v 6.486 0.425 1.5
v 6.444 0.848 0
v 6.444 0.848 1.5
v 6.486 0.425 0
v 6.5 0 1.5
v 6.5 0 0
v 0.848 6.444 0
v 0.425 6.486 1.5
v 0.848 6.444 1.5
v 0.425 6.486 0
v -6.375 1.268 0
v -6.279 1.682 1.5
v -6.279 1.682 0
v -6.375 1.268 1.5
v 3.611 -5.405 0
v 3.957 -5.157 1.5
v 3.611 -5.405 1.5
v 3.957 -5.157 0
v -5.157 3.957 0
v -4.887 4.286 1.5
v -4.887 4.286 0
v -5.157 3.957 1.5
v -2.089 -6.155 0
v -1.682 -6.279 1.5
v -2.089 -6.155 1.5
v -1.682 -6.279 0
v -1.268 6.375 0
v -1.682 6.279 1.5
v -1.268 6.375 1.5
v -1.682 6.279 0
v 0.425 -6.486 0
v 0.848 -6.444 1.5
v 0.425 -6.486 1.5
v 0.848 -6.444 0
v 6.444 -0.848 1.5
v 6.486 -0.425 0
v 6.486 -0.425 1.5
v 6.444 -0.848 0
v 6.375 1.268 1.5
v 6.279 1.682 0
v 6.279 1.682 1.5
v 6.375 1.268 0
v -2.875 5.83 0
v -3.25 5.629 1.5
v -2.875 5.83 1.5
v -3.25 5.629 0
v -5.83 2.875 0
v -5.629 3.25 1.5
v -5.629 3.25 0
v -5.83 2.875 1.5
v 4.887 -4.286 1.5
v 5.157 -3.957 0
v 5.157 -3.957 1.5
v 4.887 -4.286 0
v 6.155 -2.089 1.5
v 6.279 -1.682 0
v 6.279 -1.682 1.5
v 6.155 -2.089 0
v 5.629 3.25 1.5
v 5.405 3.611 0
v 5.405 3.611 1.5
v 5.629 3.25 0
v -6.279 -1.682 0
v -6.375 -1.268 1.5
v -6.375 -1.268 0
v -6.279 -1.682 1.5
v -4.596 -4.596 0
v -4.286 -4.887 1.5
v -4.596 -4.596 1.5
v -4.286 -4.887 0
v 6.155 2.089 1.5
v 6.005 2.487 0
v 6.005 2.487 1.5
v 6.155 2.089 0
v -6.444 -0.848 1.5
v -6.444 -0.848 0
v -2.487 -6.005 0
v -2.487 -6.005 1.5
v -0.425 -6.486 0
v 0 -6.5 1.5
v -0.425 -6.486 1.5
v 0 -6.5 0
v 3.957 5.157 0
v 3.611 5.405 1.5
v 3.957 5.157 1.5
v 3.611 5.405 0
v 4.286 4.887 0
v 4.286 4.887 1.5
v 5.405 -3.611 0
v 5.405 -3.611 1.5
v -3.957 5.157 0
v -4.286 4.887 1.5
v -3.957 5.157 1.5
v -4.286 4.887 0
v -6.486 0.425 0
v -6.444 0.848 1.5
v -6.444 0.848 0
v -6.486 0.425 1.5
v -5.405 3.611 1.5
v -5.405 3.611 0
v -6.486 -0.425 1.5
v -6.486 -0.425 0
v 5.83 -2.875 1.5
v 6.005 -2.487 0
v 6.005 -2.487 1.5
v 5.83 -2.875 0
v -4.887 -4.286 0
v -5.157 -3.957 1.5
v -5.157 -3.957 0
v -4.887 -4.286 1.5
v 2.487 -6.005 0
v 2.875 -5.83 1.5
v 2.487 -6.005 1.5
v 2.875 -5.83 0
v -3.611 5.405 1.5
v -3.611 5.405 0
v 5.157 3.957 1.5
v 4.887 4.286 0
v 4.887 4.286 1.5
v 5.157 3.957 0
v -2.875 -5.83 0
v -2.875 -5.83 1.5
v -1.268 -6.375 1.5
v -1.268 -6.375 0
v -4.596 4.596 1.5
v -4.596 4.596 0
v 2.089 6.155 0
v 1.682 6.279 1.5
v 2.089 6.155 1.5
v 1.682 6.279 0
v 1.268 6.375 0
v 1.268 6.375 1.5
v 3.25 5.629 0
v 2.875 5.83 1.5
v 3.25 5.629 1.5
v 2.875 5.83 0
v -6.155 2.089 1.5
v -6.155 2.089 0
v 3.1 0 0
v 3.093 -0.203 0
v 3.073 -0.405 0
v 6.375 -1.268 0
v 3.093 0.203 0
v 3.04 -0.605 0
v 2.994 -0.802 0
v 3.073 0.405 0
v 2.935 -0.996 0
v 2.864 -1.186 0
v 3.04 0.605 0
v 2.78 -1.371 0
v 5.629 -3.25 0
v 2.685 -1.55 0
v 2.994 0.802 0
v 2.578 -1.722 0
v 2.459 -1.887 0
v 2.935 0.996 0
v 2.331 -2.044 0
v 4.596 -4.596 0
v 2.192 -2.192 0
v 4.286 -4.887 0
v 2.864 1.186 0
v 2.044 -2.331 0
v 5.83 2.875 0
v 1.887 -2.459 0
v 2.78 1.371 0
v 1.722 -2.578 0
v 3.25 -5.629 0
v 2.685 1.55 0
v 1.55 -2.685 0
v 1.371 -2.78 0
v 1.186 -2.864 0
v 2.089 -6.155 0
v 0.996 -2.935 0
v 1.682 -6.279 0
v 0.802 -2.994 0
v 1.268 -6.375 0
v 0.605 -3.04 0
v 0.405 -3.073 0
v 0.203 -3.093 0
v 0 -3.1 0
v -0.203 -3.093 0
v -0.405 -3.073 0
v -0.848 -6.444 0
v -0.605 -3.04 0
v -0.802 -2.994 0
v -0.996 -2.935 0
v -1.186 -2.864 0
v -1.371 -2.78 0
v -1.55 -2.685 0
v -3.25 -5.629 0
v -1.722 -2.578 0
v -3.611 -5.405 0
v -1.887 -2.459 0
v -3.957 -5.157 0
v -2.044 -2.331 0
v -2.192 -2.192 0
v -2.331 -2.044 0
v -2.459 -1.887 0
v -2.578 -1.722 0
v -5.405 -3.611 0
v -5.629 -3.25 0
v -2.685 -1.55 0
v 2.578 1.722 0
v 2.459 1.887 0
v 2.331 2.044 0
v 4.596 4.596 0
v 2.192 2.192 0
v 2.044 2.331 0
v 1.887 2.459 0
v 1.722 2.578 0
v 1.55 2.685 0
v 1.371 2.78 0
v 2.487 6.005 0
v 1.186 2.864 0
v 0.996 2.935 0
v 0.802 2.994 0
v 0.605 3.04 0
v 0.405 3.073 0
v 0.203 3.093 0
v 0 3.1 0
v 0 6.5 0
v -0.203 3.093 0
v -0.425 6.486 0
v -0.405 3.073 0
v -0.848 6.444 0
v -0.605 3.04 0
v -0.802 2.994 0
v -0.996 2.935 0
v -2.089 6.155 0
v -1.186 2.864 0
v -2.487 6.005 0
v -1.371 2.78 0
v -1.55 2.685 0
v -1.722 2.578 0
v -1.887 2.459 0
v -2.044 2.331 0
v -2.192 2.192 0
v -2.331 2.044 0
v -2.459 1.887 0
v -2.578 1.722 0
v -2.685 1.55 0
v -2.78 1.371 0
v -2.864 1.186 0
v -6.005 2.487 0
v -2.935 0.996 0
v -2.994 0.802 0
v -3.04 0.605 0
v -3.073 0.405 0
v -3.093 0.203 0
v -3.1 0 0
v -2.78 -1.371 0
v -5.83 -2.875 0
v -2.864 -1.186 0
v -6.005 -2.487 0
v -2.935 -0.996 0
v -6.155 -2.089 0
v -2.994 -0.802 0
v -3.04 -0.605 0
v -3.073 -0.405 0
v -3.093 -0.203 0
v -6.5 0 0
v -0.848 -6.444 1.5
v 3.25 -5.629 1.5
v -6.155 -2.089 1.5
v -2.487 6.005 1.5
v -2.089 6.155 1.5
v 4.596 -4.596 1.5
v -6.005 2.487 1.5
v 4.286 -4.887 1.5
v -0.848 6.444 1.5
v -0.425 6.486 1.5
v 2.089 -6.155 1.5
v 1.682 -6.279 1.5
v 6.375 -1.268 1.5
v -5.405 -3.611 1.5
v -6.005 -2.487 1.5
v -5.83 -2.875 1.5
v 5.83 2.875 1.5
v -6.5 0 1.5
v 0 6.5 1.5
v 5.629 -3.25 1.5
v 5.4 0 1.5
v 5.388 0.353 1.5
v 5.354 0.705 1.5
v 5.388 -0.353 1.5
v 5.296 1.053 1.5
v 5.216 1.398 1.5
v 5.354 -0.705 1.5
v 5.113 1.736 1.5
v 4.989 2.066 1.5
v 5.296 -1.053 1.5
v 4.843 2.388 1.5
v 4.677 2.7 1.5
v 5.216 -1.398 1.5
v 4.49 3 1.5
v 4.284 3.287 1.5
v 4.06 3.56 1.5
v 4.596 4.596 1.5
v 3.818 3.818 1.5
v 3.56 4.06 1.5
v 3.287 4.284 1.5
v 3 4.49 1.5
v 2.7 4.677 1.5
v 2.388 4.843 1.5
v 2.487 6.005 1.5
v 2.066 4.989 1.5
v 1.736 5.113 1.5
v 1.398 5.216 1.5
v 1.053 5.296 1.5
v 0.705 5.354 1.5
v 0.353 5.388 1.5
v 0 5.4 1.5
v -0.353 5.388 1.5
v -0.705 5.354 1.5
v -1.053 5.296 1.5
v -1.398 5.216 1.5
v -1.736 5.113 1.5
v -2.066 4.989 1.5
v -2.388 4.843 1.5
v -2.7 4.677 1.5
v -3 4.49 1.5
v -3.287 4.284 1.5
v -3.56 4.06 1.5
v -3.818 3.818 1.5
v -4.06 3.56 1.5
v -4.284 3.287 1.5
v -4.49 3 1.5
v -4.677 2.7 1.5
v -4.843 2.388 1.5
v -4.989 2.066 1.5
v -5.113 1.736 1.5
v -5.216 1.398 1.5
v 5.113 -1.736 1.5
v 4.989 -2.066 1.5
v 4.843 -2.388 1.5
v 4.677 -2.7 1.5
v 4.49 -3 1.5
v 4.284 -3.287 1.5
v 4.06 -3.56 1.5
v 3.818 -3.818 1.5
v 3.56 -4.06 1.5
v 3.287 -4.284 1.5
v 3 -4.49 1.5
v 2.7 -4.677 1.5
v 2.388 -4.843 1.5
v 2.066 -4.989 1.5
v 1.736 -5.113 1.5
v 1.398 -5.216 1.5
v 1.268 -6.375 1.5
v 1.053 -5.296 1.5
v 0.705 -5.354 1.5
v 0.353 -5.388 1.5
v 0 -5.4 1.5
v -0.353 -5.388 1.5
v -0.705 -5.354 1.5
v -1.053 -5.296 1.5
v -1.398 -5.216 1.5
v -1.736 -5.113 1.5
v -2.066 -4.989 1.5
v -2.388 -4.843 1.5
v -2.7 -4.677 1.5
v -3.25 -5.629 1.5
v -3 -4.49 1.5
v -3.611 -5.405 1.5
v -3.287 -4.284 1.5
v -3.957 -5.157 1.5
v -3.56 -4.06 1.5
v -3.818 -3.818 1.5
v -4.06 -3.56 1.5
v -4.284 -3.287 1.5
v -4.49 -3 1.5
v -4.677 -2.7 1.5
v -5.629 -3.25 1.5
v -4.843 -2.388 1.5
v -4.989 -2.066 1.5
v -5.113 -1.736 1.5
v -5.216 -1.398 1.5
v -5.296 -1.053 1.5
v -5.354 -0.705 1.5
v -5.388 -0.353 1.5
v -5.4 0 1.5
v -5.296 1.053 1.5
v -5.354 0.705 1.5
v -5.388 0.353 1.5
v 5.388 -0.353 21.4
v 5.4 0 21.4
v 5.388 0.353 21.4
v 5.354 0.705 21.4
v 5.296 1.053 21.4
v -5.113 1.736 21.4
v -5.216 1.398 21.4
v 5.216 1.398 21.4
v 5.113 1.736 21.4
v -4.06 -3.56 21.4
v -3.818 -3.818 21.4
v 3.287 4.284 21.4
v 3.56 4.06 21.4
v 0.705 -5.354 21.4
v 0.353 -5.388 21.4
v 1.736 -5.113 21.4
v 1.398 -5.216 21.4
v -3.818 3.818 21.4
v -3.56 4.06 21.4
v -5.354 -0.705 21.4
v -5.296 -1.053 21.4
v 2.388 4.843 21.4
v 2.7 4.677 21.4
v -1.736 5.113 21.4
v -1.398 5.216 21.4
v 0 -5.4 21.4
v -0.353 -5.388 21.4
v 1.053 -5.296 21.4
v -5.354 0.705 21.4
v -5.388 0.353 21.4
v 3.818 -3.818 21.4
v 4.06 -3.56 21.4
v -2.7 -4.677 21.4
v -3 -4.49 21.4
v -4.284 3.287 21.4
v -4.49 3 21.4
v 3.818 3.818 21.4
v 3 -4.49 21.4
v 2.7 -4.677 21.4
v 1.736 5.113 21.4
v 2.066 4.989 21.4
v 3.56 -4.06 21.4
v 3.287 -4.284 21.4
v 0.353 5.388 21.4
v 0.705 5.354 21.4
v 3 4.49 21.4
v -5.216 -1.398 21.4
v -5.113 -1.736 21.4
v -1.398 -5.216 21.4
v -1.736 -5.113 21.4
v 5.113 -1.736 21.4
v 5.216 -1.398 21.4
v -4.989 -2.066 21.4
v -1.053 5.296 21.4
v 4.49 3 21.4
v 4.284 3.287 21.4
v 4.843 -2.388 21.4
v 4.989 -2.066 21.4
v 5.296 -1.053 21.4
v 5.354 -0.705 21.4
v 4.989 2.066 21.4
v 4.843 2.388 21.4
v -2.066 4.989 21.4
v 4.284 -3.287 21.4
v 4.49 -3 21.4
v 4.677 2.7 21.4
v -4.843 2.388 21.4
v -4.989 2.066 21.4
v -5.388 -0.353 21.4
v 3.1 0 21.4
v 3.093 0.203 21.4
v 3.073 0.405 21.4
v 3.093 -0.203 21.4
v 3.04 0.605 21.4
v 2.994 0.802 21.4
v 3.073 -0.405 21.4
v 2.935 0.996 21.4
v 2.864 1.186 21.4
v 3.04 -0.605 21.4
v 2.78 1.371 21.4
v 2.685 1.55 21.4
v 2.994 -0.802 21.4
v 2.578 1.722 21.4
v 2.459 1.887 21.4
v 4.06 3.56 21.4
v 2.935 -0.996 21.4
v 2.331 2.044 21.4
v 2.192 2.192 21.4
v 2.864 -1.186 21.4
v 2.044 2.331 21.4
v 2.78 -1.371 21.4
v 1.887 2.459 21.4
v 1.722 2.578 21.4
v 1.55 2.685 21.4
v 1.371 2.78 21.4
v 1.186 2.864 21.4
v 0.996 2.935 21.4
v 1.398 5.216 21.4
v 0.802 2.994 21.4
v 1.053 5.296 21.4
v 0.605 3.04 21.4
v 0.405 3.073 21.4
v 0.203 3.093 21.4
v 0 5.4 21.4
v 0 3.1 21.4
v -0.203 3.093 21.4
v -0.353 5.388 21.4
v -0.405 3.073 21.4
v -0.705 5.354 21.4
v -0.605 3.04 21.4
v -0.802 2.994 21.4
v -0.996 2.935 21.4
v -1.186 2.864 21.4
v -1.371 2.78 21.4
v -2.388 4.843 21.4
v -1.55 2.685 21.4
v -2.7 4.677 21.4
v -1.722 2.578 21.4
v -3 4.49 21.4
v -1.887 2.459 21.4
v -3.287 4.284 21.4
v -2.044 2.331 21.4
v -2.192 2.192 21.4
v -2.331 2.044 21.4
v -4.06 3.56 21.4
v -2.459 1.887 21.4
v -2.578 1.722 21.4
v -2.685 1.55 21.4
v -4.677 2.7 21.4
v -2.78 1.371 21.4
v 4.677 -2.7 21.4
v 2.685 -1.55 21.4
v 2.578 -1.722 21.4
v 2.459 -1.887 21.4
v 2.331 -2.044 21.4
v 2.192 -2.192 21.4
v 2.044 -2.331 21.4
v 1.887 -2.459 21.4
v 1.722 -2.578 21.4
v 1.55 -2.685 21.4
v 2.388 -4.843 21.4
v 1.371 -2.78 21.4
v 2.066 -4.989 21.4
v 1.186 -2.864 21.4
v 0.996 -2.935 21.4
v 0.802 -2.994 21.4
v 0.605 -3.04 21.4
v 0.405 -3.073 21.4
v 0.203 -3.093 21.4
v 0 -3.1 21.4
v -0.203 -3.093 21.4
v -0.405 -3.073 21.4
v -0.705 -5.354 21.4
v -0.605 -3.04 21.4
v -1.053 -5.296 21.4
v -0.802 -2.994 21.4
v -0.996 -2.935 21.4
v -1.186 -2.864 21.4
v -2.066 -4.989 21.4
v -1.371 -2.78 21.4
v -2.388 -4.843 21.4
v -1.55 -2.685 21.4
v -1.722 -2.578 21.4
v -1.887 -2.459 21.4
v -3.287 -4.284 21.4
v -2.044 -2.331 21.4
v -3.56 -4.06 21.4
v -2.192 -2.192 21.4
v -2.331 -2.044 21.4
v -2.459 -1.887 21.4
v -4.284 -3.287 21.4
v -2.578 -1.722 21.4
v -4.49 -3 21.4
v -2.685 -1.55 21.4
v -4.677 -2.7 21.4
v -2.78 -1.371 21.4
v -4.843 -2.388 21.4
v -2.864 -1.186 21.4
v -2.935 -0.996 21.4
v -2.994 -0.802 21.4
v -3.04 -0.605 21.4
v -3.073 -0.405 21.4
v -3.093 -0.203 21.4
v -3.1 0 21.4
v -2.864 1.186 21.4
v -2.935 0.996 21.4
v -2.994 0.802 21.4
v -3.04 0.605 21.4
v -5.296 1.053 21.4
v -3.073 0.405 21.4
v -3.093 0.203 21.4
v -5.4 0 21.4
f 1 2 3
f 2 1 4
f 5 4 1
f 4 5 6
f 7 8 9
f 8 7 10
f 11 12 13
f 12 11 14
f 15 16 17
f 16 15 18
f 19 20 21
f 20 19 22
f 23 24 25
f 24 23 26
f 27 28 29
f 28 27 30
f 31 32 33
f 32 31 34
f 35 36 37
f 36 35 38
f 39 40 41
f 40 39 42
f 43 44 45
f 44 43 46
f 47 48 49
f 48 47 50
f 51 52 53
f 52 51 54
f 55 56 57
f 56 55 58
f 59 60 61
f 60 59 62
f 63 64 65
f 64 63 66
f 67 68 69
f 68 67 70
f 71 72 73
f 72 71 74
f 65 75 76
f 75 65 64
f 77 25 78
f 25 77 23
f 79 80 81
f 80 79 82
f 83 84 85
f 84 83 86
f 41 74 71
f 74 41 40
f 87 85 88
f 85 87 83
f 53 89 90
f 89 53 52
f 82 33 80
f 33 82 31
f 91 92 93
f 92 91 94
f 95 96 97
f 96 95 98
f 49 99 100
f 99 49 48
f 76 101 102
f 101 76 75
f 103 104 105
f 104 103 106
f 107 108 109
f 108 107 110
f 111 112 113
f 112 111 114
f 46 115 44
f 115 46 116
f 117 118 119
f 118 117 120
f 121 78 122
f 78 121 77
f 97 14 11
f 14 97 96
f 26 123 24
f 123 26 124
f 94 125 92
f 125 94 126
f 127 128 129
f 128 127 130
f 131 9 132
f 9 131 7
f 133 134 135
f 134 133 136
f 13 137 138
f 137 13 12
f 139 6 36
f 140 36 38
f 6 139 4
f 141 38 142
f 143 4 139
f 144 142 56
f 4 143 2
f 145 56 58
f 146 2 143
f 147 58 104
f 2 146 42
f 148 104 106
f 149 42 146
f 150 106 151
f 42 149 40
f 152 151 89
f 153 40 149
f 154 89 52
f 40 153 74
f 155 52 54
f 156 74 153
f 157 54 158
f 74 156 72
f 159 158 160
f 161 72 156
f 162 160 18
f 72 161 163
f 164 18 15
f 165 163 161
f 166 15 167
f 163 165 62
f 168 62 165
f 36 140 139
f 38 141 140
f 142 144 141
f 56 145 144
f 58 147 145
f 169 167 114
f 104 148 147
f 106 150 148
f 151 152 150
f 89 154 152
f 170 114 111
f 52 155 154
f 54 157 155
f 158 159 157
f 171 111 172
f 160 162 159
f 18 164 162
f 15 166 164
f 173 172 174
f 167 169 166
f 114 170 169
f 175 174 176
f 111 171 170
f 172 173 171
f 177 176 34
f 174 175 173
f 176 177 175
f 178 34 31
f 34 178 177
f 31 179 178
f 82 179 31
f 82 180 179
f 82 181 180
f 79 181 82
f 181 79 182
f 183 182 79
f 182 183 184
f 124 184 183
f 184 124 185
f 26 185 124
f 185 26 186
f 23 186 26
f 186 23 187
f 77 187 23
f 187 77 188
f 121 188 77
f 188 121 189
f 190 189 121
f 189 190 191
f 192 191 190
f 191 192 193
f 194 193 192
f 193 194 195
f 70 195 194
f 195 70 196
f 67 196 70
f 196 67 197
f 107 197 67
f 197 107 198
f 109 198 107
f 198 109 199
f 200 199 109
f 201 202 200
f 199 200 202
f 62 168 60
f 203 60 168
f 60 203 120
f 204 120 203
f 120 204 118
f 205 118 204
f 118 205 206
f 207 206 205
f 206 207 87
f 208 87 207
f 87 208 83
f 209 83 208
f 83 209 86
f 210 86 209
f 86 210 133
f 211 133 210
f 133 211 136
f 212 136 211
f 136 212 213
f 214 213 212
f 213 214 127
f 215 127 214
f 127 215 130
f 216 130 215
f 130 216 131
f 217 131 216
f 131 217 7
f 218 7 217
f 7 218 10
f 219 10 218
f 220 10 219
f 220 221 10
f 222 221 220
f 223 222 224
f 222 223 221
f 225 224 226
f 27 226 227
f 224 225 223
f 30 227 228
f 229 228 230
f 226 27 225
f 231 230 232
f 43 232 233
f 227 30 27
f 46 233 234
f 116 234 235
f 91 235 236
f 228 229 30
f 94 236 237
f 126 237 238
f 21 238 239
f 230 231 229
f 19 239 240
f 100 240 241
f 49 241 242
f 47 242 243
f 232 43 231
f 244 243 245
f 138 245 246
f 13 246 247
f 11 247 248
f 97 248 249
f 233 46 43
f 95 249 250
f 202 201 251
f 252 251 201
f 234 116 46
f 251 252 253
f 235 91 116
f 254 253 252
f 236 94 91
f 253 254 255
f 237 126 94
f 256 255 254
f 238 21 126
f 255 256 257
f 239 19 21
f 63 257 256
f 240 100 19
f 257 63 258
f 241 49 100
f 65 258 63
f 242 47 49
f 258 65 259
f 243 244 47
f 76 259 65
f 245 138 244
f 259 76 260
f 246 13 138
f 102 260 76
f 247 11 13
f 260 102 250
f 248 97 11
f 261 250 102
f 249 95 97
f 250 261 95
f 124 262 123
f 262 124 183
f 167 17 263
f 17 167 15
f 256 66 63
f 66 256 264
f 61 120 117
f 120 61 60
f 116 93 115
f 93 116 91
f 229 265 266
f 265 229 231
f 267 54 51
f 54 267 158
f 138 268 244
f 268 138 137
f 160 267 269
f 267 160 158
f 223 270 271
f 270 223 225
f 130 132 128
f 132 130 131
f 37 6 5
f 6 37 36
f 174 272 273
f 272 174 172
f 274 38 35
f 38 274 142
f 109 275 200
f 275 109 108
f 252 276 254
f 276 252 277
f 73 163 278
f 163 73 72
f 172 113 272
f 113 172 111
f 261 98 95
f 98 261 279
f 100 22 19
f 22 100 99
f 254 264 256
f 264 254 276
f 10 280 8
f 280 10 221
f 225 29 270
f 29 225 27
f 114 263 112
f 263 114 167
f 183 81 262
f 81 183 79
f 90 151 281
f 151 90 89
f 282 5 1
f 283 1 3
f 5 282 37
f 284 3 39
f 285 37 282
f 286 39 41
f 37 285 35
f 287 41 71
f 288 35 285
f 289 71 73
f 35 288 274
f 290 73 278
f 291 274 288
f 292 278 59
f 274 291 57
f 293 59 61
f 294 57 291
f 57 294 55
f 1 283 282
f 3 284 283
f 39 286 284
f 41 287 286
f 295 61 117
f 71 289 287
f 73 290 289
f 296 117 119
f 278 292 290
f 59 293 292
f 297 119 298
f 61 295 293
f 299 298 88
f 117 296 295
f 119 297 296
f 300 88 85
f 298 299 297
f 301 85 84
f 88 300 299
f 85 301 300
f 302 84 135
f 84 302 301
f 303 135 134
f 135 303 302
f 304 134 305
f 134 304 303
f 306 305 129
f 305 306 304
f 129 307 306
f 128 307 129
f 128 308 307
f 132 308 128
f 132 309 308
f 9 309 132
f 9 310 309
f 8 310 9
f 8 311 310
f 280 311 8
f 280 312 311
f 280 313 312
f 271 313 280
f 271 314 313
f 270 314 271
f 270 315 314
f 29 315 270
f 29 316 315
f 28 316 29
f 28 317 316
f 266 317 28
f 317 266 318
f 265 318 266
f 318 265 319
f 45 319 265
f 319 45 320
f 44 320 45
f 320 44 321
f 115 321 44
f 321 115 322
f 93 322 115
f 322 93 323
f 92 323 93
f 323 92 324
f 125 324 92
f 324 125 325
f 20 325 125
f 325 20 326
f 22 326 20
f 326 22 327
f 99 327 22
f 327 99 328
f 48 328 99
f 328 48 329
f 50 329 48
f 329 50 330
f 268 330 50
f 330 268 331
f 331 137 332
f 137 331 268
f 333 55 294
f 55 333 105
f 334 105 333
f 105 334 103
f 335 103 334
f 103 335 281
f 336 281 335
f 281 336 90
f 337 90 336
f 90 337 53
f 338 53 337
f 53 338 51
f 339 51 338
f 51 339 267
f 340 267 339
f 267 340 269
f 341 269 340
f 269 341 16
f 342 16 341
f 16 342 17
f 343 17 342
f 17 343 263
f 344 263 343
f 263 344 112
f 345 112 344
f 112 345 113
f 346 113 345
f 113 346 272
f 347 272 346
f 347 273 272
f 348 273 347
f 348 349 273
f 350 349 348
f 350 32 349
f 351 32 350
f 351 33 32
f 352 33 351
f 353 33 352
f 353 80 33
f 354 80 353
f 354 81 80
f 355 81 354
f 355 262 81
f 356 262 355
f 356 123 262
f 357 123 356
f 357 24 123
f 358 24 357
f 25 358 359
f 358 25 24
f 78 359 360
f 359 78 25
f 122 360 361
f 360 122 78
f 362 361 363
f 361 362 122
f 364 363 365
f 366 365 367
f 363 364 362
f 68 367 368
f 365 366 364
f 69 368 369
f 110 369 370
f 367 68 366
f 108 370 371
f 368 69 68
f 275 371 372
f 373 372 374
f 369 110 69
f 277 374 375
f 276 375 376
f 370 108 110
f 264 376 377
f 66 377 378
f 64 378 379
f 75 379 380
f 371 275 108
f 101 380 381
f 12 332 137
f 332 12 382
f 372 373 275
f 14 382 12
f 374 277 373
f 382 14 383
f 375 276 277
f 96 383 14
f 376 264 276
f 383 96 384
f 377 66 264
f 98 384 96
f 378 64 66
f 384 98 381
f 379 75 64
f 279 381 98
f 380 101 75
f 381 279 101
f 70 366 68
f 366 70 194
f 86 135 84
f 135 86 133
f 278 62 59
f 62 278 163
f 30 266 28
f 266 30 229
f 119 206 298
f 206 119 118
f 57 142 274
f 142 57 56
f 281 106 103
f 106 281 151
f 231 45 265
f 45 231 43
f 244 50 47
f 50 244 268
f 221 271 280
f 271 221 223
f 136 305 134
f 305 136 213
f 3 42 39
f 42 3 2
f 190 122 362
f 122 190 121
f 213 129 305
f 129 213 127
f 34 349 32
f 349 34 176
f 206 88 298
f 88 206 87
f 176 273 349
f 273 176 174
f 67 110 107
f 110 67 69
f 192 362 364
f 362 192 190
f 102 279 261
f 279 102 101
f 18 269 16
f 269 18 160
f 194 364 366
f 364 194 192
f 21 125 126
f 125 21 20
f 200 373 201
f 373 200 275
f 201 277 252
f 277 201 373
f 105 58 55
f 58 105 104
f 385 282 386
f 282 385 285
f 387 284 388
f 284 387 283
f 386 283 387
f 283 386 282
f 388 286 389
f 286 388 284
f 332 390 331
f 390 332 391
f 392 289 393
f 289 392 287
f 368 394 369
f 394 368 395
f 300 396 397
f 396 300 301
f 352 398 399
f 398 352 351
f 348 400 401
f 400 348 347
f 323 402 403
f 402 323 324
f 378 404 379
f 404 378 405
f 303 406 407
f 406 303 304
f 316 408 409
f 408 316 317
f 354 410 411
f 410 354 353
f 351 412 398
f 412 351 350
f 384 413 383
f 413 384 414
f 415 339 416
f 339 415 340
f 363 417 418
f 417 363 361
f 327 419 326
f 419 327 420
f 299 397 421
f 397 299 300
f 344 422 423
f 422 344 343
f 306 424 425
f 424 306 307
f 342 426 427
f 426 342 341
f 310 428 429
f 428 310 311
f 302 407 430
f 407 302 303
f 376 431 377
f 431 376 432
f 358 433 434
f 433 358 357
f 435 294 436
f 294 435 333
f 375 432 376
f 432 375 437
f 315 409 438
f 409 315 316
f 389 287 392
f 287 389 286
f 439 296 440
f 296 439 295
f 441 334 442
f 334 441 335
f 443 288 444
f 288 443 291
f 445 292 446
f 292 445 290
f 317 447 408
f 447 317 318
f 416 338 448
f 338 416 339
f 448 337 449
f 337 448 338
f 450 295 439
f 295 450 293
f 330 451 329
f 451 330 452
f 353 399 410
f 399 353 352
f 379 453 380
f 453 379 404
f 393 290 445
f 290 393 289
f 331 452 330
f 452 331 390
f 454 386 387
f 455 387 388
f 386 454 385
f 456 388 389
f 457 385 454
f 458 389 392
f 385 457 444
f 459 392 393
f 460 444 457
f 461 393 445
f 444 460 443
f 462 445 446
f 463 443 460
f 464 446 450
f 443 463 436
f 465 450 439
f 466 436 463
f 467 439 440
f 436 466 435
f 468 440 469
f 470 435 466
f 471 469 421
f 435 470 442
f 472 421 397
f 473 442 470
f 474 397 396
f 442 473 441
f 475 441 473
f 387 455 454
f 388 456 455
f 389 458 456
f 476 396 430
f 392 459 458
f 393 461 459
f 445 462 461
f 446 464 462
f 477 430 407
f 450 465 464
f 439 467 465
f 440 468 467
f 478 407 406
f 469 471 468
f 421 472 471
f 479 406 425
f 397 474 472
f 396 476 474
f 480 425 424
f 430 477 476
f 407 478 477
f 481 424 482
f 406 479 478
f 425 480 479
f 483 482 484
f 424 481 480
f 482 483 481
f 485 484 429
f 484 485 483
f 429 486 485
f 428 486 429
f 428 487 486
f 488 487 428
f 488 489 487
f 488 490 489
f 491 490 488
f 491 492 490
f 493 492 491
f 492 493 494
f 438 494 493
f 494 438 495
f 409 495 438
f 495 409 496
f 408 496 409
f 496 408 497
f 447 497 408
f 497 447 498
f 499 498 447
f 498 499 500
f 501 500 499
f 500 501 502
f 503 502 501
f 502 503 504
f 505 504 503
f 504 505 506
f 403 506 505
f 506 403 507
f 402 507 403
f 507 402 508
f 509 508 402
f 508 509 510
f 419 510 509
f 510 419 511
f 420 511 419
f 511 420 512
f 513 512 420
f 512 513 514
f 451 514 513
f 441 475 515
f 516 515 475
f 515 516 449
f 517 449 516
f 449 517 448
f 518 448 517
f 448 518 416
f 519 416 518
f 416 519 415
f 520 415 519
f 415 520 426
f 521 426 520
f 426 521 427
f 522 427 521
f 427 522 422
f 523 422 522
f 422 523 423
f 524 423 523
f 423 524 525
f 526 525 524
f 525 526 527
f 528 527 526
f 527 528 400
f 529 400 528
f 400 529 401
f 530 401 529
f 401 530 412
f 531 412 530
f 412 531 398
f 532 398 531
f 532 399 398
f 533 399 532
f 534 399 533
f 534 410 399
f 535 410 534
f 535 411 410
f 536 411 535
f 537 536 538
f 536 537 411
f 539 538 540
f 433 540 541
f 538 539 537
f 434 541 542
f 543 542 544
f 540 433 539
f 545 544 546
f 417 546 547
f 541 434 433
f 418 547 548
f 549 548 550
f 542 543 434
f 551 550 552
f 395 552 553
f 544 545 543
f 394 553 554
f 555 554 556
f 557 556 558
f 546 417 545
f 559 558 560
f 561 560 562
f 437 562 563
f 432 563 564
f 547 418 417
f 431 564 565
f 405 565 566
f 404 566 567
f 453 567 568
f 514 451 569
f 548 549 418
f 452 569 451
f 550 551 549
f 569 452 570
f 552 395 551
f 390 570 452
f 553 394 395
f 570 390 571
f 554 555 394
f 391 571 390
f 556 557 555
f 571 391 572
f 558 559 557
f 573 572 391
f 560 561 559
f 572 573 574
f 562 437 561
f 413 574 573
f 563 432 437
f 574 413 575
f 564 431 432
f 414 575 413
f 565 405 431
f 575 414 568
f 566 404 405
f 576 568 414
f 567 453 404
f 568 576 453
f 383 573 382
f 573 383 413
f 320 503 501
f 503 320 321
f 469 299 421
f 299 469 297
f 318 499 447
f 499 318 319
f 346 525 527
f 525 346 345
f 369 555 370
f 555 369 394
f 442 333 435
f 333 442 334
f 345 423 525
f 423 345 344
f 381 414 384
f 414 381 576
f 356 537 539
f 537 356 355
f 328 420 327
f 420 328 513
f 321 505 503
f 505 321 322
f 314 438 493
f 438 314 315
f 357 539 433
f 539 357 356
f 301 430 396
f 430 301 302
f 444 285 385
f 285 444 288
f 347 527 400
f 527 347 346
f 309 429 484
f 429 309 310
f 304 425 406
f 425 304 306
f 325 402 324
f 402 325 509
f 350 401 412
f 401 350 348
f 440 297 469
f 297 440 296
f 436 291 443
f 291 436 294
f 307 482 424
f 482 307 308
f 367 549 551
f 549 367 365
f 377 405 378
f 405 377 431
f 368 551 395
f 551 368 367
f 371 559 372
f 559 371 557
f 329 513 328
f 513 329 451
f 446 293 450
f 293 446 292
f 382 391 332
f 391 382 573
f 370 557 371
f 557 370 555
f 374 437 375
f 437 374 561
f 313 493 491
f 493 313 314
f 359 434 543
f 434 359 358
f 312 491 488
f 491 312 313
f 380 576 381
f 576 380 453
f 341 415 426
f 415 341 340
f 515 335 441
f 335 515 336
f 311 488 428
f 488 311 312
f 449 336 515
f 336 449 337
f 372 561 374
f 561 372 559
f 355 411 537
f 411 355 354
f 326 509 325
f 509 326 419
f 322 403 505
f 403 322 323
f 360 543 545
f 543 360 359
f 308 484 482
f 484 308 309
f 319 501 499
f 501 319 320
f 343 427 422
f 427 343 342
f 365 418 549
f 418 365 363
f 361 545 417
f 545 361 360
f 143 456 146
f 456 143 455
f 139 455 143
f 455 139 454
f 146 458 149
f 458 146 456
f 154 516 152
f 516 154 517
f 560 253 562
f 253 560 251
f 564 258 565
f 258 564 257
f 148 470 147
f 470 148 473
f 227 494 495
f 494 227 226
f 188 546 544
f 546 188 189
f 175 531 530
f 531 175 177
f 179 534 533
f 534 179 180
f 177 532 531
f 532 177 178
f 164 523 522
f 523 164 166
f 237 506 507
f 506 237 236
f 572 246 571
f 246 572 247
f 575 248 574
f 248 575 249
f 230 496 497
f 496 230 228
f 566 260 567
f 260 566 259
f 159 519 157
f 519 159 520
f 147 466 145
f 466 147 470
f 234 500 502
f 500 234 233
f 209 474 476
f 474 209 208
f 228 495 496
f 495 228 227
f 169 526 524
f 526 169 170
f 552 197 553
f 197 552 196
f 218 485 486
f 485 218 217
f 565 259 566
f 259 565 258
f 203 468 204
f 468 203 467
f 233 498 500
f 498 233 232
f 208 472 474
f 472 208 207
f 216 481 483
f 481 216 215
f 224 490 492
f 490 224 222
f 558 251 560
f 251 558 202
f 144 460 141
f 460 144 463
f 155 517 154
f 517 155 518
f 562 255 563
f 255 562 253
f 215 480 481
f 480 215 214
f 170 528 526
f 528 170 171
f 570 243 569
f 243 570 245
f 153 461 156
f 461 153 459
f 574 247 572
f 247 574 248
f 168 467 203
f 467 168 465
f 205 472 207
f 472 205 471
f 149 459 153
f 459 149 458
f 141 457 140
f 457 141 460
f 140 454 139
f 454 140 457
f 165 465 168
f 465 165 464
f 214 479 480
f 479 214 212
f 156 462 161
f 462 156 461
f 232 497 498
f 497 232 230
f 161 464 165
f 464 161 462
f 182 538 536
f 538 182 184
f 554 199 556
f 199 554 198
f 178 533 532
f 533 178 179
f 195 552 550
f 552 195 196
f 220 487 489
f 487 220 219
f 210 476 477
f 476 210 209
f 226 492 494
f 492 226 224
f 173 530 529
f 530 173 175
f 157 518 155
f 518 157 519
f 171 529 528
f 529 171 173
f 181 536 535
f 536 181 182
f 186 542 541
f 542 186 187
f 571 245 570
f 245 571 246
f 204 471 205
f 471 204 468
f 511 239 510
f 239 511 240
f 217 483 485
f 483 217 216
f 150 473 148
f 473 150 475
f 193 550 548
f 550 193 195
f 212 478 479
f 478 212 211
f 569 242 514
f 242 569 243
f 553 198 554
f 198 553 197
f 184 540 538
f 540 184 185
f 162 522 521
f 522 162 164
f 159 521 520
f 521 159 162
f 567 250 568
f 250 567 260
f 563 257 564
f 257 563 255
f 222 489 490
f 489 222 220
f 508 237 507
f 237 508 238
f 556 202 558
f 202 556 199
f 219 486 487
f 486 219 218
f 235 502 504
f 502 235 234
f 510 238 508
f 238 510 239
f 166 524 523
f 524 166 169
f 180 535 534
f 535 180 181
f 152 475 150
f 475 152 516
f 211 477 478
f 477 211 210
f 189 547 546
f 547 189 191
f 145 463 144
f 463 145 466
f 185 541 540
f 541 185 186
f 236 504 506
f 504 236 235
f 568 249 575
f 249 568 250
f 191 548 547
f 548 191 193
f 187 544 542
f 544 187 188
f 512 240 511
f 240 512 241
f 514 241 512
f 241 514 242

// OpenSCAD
// PCR tube adapter sleeve: fits a 0.2 mL tube into a 1.5 mL rack hole
// Print orientation: collar on the bed, tube opening facing up

// ---- Dimensions (mm) ----
collar_d      = 13;     // collar outer diameter
collar_h      = 1.5;    // collar thickness (z = 0 to 1.5)
sleeve_od     = 10.8;   // sleeve body outer diameter
sleeve_h      = 19.9;   // sleeve body height above collar (z = 1.5 to 21.4)
bore_d        = 6.2;    // straight through-bore diameter
eps           = 0.5;    // cutter overshoot past faces

$fn = 96;

total_h = collar_h + sleeve_h; // 21.4 mm top of sleeve

difference() {
    union() {
        // Collar
        cylinder(d = collar_d, h = collar_h);
        // Sleeve body (slightly overlapping the collar for a clean union)
        translate([0, 0, collar_h - 0.01])
            cylinder(d = sleeve_od, h = sleeve_h + 0.01);
    }
    // Full-height bore, open at both ends
    translate([0, 0, -eps])
        cylinder(d = bore_d, h = total_h + 2 * eps);
}
